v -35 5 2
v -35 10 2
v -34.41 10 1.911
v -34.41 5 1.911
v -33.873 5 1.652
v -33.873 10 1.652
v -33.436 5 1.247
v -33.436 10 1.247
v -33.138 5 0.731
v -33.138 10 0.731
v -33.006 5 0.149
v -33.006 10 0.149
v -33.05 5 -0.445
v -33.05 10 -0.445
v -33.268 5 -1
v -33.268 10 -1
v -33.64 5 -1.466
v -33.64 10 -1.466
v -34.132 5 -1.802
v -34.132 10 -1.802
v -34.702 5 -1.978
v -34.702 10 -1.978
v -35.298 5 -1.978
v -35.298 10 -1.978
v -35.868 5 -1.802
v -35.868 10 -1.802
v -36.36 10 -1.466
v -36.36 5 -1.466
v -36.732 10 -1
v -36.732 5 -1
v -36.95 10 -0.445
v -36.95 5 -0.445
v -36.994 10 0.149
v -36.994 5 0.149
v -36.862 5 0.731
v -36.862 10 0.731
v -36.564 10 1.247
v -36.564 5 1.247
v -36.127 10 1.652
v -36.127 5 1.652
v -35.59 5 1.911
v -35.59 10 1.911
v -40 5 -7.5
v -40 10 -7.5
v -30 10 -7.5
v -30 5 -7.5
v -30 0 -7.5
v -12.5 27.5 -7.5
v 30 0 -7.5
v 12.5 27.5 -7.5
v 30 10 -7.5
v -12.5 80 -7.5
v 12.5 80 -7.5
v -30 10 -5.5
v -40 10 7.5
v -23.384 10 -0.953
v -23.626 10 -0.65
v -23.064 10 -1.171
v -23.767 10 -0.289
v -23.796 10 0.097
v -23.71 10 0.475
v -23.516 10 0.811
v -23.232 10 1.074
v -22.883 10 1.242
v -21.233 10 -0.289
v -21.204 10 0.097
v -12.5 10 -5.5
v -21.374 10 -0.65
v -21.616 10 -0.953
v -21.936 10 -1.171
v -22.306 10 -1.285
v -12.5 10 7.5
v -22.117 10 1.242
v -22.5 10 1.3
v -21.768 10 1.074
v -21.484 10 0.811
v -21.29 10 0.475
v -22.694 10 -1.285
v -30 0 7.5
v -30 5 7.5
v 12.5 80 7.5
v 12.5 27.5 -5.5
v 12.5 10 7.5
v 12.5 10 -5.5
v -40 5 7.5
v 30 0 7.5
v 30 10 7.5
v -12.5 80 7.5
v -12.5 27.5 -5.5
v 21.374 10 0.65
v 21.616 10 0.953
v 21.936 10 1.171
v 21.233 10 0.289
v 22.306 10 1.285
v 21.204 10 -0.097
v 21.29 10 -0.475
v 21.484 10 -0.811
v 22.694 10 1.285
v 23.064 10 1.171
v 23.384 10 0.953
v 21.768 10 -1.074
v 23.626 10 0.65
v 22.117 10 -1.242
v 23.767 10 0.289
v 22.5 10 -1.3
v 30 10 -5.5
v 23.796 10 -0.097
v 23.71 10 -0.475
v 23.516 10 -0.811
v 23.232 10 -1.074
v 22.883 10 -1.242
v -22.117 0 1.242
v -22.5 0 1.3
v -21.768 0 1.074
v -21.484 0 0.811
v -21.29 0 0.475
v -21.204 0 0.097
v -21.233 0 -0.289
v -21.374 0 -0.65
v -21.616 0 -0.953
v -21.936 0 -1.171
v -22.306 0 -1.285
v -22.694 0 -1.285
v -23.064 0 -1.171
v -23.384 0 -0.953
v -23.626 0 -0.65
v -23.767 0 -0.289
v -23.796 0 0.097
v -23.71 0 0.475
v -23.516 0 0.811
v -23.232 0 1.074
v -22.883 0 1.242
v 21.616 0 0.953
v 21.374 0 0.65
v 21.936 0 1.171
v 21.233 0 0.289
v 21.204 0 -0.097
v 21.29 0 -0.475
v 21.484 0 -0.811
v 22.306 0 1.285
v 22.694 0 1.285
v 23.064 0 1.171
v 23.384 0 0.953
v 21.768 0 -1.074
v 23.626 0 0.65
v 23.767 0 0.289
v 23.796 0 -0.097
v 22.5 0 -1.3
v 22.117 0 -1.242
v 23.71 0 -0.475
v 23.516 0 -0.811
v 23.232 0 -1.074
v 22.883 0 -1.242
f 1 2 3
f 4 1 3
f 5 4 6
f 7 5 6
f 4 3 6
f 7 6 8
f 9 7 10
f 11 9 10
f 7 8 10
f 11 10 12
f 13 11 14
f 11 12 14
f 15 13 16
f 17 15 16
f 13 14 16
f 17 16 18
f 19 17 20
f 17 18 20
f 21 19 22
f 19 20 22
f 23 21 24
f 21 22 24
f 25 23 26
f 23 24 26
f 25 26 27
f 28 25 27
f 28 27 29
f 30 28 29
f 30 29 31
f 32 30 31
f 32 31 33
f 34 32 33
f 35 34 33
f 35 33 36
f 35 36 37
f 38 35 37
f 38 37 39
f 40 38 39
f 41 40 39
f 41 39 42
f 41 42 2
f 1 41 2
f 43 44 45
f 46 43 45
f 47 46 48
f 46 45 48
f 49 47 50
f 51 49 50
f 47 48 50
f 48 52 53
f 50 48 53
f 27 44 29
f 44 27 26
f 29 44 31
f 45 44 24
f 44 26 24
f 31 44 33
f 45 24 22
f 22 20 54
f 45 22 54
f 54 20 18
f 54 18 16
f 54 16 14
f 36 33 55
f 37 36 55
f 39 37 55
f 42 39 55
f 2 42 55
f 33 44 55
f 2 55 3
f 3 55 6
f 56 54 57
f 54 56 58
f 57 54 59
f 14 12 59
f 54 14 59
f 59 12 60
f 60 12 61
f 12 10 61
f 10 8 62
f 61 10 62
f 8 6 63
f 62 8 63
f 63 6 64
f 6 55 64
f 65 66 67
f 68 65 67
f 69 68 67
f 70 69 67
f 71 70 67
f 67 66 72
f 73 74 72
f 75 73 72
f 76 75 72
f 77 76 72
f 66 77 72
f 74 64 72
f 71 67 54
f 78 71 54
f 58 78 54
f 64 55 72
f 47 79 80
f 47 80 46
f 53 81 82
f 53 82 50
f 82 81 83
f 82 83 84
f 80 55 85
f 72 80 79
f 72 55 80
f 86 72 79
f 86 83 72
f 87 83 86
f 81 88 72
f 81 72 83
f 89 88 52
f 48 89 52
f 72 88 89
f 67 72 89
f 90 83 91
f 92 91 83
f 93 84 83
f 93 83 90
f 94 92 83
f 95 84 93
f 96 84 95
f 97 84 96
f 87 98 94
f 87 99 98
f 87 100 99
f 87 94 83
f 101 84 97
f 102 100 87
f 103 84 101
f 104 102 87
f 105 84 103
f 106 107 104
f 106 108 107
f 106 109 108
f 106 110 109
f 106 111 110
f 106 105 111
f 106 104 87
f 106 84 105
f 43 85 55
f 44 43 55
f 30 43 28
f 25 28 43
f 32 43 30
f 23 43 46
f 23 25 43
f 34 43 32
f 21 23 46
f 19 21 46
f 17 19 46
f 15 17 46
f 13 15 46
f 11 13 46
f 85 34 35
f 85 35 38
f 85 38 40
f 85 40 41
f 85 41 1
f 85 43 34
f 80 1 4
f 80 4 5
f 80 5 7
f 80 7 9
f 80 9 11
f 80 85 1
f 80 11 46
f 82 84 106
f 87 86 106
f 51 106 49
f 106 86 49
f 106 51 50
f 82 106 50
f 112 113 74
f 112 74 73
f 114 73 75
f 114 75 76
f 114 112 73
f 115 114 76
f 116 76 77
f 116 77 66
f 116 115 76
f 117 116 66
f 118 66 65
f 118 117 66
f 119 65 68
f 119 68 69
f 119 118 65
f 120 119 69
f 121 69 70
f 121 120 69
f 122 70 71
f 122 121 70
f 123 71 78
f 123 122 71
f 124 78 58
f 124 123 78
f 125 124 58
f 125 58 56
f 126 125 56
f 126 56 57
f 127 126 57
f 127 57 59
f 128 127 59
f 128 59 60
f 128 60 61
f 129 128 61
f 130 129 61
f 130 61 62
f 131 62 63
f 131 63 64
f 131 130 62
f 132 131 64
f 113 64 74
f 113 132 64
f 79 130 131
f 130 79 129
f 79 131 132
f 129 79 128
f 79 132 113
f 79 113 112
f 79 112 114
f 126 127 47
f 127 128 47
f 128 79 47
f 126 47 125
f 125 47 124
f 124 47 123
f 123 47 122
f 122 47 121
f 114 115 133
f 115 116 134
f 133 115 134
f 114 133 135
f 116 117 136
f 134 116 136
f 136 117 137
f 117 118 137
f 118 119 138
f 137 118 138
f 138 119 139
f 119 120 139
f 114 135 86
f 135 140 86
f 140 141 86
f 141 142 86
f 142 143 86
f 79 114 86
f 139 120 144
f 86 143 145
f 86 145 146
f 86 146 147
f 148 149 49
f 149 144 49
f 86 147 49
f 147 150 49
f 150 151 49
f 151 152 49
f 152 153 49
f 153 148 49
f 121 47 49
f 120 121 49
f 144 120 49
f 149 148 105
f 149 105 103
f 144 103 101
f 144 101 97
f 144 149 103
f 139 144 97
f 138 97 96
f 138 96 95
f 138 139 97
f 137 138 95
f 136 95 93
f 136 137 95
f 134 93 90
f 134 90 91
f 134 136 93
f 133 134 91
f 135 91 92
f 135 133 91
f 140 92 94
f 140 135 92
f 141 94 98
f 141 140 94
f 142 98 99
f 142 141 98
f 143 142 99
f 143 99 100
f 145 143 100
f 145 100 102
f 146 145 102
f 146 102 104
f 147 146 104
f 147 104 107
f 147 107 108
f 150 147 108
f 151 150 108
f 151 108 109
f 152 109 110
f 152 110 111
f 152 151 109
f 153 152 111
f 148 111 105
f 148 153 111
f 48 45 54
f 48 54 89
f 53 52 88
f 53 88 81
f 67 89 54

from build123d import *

# Parameters (mm, degrees)
SKETCH_2_W          = 60
SKETCH_2_H          = 15
SKETCH_2_R          = 1.3
EXTRUDE_1_DEPTH     = 10
SKETCH_3_W          = 25
SKETCH_3_H          = 15
EXTRUDE_2_DEPTH     = 70
EXTRUDE_3_DEPTH     = 2
SKETCH_6_W          = 10
SKETCH_6_H          = 5
EXTRUDE_4_DEPTH     = 15
SKETCH_7_R          = 2
CUT_EXTRUDE_1_DEPTH = 81.970673704


with BuildPart() as part:
    # 草圖2 → 填料-伸長1 (new body)
    with BuildSketch(Plane(origin=(0, 0, 0), x_dir=(1, 0, 0), z_dir=(0, 1, 0))):
        Rectangle(SKETCH_2_W, SKETCH_2_H)
        with Locations(Location((-22.5, 0, 0), (0, 0, 270))):
            Circle(SKETCH_2_R, mode=Mode.SUBTRACT)
        with Locations(Location((22.5, 0, 0), (0, 0, 90))):
            Circle(SKETCH_2_R, mode=Mode.SUBTRACT)
    extrude(amount=EXTRUDE_1_DEPTH)

    # 草圖3 → 填料-伸長2 (add)
    with BuildSketch(Plane(origin=(0, 10, 0), x_dir=(1, 0, 0), z_dir=(0, 1, 0))):
        Rectangle(SKETCH_3_W, SKETCH_3_H)
    extrude(amount=EXTRUDE_2_DEPTH)

    # 草圖5 → 填料-伸長3 (add)
    with BuildSketch(Plane(origin=(0, 0, -7.5), x_dir=(-1, 0, 0), z_dir=(0, 0, -1))):
        Polygon((-30, 10), (-12.5, 27.5), (-12.5, 10), align=None)
        Polygon((12.5, 27.5), (12.5, 10), (30, 10), align=None)
    extrude(amount=-EXTRUDE_3_DEPTH)

    # 草圖6 → 填料-伸長4 (add)
    with BuildSketch(Plane.XY.offset(7.5)):
        with Locations((-35, 7.5)):
            Rectangle(SKETCH_6_W, SKETCH_6_H)
    extrude(amount=-EXTRUDE_4_DEPTH)

    # 草圖7 → 除料-伸長1 (cut, through all)
    with BuildSketch(Plane(origin=(0, 10, 0), x_dir=(1, 0, 0), z_dir=(0, 1, 0))):
        with Locations(Location((-35, 0, 0), (0, 0, 270))):
            Circle(SKETCH_7_R)
    extrude(amount=-CUT_EXTRUDE_1_DEPTH, mode=Mode.SUBTRACT)


solid = part.part
